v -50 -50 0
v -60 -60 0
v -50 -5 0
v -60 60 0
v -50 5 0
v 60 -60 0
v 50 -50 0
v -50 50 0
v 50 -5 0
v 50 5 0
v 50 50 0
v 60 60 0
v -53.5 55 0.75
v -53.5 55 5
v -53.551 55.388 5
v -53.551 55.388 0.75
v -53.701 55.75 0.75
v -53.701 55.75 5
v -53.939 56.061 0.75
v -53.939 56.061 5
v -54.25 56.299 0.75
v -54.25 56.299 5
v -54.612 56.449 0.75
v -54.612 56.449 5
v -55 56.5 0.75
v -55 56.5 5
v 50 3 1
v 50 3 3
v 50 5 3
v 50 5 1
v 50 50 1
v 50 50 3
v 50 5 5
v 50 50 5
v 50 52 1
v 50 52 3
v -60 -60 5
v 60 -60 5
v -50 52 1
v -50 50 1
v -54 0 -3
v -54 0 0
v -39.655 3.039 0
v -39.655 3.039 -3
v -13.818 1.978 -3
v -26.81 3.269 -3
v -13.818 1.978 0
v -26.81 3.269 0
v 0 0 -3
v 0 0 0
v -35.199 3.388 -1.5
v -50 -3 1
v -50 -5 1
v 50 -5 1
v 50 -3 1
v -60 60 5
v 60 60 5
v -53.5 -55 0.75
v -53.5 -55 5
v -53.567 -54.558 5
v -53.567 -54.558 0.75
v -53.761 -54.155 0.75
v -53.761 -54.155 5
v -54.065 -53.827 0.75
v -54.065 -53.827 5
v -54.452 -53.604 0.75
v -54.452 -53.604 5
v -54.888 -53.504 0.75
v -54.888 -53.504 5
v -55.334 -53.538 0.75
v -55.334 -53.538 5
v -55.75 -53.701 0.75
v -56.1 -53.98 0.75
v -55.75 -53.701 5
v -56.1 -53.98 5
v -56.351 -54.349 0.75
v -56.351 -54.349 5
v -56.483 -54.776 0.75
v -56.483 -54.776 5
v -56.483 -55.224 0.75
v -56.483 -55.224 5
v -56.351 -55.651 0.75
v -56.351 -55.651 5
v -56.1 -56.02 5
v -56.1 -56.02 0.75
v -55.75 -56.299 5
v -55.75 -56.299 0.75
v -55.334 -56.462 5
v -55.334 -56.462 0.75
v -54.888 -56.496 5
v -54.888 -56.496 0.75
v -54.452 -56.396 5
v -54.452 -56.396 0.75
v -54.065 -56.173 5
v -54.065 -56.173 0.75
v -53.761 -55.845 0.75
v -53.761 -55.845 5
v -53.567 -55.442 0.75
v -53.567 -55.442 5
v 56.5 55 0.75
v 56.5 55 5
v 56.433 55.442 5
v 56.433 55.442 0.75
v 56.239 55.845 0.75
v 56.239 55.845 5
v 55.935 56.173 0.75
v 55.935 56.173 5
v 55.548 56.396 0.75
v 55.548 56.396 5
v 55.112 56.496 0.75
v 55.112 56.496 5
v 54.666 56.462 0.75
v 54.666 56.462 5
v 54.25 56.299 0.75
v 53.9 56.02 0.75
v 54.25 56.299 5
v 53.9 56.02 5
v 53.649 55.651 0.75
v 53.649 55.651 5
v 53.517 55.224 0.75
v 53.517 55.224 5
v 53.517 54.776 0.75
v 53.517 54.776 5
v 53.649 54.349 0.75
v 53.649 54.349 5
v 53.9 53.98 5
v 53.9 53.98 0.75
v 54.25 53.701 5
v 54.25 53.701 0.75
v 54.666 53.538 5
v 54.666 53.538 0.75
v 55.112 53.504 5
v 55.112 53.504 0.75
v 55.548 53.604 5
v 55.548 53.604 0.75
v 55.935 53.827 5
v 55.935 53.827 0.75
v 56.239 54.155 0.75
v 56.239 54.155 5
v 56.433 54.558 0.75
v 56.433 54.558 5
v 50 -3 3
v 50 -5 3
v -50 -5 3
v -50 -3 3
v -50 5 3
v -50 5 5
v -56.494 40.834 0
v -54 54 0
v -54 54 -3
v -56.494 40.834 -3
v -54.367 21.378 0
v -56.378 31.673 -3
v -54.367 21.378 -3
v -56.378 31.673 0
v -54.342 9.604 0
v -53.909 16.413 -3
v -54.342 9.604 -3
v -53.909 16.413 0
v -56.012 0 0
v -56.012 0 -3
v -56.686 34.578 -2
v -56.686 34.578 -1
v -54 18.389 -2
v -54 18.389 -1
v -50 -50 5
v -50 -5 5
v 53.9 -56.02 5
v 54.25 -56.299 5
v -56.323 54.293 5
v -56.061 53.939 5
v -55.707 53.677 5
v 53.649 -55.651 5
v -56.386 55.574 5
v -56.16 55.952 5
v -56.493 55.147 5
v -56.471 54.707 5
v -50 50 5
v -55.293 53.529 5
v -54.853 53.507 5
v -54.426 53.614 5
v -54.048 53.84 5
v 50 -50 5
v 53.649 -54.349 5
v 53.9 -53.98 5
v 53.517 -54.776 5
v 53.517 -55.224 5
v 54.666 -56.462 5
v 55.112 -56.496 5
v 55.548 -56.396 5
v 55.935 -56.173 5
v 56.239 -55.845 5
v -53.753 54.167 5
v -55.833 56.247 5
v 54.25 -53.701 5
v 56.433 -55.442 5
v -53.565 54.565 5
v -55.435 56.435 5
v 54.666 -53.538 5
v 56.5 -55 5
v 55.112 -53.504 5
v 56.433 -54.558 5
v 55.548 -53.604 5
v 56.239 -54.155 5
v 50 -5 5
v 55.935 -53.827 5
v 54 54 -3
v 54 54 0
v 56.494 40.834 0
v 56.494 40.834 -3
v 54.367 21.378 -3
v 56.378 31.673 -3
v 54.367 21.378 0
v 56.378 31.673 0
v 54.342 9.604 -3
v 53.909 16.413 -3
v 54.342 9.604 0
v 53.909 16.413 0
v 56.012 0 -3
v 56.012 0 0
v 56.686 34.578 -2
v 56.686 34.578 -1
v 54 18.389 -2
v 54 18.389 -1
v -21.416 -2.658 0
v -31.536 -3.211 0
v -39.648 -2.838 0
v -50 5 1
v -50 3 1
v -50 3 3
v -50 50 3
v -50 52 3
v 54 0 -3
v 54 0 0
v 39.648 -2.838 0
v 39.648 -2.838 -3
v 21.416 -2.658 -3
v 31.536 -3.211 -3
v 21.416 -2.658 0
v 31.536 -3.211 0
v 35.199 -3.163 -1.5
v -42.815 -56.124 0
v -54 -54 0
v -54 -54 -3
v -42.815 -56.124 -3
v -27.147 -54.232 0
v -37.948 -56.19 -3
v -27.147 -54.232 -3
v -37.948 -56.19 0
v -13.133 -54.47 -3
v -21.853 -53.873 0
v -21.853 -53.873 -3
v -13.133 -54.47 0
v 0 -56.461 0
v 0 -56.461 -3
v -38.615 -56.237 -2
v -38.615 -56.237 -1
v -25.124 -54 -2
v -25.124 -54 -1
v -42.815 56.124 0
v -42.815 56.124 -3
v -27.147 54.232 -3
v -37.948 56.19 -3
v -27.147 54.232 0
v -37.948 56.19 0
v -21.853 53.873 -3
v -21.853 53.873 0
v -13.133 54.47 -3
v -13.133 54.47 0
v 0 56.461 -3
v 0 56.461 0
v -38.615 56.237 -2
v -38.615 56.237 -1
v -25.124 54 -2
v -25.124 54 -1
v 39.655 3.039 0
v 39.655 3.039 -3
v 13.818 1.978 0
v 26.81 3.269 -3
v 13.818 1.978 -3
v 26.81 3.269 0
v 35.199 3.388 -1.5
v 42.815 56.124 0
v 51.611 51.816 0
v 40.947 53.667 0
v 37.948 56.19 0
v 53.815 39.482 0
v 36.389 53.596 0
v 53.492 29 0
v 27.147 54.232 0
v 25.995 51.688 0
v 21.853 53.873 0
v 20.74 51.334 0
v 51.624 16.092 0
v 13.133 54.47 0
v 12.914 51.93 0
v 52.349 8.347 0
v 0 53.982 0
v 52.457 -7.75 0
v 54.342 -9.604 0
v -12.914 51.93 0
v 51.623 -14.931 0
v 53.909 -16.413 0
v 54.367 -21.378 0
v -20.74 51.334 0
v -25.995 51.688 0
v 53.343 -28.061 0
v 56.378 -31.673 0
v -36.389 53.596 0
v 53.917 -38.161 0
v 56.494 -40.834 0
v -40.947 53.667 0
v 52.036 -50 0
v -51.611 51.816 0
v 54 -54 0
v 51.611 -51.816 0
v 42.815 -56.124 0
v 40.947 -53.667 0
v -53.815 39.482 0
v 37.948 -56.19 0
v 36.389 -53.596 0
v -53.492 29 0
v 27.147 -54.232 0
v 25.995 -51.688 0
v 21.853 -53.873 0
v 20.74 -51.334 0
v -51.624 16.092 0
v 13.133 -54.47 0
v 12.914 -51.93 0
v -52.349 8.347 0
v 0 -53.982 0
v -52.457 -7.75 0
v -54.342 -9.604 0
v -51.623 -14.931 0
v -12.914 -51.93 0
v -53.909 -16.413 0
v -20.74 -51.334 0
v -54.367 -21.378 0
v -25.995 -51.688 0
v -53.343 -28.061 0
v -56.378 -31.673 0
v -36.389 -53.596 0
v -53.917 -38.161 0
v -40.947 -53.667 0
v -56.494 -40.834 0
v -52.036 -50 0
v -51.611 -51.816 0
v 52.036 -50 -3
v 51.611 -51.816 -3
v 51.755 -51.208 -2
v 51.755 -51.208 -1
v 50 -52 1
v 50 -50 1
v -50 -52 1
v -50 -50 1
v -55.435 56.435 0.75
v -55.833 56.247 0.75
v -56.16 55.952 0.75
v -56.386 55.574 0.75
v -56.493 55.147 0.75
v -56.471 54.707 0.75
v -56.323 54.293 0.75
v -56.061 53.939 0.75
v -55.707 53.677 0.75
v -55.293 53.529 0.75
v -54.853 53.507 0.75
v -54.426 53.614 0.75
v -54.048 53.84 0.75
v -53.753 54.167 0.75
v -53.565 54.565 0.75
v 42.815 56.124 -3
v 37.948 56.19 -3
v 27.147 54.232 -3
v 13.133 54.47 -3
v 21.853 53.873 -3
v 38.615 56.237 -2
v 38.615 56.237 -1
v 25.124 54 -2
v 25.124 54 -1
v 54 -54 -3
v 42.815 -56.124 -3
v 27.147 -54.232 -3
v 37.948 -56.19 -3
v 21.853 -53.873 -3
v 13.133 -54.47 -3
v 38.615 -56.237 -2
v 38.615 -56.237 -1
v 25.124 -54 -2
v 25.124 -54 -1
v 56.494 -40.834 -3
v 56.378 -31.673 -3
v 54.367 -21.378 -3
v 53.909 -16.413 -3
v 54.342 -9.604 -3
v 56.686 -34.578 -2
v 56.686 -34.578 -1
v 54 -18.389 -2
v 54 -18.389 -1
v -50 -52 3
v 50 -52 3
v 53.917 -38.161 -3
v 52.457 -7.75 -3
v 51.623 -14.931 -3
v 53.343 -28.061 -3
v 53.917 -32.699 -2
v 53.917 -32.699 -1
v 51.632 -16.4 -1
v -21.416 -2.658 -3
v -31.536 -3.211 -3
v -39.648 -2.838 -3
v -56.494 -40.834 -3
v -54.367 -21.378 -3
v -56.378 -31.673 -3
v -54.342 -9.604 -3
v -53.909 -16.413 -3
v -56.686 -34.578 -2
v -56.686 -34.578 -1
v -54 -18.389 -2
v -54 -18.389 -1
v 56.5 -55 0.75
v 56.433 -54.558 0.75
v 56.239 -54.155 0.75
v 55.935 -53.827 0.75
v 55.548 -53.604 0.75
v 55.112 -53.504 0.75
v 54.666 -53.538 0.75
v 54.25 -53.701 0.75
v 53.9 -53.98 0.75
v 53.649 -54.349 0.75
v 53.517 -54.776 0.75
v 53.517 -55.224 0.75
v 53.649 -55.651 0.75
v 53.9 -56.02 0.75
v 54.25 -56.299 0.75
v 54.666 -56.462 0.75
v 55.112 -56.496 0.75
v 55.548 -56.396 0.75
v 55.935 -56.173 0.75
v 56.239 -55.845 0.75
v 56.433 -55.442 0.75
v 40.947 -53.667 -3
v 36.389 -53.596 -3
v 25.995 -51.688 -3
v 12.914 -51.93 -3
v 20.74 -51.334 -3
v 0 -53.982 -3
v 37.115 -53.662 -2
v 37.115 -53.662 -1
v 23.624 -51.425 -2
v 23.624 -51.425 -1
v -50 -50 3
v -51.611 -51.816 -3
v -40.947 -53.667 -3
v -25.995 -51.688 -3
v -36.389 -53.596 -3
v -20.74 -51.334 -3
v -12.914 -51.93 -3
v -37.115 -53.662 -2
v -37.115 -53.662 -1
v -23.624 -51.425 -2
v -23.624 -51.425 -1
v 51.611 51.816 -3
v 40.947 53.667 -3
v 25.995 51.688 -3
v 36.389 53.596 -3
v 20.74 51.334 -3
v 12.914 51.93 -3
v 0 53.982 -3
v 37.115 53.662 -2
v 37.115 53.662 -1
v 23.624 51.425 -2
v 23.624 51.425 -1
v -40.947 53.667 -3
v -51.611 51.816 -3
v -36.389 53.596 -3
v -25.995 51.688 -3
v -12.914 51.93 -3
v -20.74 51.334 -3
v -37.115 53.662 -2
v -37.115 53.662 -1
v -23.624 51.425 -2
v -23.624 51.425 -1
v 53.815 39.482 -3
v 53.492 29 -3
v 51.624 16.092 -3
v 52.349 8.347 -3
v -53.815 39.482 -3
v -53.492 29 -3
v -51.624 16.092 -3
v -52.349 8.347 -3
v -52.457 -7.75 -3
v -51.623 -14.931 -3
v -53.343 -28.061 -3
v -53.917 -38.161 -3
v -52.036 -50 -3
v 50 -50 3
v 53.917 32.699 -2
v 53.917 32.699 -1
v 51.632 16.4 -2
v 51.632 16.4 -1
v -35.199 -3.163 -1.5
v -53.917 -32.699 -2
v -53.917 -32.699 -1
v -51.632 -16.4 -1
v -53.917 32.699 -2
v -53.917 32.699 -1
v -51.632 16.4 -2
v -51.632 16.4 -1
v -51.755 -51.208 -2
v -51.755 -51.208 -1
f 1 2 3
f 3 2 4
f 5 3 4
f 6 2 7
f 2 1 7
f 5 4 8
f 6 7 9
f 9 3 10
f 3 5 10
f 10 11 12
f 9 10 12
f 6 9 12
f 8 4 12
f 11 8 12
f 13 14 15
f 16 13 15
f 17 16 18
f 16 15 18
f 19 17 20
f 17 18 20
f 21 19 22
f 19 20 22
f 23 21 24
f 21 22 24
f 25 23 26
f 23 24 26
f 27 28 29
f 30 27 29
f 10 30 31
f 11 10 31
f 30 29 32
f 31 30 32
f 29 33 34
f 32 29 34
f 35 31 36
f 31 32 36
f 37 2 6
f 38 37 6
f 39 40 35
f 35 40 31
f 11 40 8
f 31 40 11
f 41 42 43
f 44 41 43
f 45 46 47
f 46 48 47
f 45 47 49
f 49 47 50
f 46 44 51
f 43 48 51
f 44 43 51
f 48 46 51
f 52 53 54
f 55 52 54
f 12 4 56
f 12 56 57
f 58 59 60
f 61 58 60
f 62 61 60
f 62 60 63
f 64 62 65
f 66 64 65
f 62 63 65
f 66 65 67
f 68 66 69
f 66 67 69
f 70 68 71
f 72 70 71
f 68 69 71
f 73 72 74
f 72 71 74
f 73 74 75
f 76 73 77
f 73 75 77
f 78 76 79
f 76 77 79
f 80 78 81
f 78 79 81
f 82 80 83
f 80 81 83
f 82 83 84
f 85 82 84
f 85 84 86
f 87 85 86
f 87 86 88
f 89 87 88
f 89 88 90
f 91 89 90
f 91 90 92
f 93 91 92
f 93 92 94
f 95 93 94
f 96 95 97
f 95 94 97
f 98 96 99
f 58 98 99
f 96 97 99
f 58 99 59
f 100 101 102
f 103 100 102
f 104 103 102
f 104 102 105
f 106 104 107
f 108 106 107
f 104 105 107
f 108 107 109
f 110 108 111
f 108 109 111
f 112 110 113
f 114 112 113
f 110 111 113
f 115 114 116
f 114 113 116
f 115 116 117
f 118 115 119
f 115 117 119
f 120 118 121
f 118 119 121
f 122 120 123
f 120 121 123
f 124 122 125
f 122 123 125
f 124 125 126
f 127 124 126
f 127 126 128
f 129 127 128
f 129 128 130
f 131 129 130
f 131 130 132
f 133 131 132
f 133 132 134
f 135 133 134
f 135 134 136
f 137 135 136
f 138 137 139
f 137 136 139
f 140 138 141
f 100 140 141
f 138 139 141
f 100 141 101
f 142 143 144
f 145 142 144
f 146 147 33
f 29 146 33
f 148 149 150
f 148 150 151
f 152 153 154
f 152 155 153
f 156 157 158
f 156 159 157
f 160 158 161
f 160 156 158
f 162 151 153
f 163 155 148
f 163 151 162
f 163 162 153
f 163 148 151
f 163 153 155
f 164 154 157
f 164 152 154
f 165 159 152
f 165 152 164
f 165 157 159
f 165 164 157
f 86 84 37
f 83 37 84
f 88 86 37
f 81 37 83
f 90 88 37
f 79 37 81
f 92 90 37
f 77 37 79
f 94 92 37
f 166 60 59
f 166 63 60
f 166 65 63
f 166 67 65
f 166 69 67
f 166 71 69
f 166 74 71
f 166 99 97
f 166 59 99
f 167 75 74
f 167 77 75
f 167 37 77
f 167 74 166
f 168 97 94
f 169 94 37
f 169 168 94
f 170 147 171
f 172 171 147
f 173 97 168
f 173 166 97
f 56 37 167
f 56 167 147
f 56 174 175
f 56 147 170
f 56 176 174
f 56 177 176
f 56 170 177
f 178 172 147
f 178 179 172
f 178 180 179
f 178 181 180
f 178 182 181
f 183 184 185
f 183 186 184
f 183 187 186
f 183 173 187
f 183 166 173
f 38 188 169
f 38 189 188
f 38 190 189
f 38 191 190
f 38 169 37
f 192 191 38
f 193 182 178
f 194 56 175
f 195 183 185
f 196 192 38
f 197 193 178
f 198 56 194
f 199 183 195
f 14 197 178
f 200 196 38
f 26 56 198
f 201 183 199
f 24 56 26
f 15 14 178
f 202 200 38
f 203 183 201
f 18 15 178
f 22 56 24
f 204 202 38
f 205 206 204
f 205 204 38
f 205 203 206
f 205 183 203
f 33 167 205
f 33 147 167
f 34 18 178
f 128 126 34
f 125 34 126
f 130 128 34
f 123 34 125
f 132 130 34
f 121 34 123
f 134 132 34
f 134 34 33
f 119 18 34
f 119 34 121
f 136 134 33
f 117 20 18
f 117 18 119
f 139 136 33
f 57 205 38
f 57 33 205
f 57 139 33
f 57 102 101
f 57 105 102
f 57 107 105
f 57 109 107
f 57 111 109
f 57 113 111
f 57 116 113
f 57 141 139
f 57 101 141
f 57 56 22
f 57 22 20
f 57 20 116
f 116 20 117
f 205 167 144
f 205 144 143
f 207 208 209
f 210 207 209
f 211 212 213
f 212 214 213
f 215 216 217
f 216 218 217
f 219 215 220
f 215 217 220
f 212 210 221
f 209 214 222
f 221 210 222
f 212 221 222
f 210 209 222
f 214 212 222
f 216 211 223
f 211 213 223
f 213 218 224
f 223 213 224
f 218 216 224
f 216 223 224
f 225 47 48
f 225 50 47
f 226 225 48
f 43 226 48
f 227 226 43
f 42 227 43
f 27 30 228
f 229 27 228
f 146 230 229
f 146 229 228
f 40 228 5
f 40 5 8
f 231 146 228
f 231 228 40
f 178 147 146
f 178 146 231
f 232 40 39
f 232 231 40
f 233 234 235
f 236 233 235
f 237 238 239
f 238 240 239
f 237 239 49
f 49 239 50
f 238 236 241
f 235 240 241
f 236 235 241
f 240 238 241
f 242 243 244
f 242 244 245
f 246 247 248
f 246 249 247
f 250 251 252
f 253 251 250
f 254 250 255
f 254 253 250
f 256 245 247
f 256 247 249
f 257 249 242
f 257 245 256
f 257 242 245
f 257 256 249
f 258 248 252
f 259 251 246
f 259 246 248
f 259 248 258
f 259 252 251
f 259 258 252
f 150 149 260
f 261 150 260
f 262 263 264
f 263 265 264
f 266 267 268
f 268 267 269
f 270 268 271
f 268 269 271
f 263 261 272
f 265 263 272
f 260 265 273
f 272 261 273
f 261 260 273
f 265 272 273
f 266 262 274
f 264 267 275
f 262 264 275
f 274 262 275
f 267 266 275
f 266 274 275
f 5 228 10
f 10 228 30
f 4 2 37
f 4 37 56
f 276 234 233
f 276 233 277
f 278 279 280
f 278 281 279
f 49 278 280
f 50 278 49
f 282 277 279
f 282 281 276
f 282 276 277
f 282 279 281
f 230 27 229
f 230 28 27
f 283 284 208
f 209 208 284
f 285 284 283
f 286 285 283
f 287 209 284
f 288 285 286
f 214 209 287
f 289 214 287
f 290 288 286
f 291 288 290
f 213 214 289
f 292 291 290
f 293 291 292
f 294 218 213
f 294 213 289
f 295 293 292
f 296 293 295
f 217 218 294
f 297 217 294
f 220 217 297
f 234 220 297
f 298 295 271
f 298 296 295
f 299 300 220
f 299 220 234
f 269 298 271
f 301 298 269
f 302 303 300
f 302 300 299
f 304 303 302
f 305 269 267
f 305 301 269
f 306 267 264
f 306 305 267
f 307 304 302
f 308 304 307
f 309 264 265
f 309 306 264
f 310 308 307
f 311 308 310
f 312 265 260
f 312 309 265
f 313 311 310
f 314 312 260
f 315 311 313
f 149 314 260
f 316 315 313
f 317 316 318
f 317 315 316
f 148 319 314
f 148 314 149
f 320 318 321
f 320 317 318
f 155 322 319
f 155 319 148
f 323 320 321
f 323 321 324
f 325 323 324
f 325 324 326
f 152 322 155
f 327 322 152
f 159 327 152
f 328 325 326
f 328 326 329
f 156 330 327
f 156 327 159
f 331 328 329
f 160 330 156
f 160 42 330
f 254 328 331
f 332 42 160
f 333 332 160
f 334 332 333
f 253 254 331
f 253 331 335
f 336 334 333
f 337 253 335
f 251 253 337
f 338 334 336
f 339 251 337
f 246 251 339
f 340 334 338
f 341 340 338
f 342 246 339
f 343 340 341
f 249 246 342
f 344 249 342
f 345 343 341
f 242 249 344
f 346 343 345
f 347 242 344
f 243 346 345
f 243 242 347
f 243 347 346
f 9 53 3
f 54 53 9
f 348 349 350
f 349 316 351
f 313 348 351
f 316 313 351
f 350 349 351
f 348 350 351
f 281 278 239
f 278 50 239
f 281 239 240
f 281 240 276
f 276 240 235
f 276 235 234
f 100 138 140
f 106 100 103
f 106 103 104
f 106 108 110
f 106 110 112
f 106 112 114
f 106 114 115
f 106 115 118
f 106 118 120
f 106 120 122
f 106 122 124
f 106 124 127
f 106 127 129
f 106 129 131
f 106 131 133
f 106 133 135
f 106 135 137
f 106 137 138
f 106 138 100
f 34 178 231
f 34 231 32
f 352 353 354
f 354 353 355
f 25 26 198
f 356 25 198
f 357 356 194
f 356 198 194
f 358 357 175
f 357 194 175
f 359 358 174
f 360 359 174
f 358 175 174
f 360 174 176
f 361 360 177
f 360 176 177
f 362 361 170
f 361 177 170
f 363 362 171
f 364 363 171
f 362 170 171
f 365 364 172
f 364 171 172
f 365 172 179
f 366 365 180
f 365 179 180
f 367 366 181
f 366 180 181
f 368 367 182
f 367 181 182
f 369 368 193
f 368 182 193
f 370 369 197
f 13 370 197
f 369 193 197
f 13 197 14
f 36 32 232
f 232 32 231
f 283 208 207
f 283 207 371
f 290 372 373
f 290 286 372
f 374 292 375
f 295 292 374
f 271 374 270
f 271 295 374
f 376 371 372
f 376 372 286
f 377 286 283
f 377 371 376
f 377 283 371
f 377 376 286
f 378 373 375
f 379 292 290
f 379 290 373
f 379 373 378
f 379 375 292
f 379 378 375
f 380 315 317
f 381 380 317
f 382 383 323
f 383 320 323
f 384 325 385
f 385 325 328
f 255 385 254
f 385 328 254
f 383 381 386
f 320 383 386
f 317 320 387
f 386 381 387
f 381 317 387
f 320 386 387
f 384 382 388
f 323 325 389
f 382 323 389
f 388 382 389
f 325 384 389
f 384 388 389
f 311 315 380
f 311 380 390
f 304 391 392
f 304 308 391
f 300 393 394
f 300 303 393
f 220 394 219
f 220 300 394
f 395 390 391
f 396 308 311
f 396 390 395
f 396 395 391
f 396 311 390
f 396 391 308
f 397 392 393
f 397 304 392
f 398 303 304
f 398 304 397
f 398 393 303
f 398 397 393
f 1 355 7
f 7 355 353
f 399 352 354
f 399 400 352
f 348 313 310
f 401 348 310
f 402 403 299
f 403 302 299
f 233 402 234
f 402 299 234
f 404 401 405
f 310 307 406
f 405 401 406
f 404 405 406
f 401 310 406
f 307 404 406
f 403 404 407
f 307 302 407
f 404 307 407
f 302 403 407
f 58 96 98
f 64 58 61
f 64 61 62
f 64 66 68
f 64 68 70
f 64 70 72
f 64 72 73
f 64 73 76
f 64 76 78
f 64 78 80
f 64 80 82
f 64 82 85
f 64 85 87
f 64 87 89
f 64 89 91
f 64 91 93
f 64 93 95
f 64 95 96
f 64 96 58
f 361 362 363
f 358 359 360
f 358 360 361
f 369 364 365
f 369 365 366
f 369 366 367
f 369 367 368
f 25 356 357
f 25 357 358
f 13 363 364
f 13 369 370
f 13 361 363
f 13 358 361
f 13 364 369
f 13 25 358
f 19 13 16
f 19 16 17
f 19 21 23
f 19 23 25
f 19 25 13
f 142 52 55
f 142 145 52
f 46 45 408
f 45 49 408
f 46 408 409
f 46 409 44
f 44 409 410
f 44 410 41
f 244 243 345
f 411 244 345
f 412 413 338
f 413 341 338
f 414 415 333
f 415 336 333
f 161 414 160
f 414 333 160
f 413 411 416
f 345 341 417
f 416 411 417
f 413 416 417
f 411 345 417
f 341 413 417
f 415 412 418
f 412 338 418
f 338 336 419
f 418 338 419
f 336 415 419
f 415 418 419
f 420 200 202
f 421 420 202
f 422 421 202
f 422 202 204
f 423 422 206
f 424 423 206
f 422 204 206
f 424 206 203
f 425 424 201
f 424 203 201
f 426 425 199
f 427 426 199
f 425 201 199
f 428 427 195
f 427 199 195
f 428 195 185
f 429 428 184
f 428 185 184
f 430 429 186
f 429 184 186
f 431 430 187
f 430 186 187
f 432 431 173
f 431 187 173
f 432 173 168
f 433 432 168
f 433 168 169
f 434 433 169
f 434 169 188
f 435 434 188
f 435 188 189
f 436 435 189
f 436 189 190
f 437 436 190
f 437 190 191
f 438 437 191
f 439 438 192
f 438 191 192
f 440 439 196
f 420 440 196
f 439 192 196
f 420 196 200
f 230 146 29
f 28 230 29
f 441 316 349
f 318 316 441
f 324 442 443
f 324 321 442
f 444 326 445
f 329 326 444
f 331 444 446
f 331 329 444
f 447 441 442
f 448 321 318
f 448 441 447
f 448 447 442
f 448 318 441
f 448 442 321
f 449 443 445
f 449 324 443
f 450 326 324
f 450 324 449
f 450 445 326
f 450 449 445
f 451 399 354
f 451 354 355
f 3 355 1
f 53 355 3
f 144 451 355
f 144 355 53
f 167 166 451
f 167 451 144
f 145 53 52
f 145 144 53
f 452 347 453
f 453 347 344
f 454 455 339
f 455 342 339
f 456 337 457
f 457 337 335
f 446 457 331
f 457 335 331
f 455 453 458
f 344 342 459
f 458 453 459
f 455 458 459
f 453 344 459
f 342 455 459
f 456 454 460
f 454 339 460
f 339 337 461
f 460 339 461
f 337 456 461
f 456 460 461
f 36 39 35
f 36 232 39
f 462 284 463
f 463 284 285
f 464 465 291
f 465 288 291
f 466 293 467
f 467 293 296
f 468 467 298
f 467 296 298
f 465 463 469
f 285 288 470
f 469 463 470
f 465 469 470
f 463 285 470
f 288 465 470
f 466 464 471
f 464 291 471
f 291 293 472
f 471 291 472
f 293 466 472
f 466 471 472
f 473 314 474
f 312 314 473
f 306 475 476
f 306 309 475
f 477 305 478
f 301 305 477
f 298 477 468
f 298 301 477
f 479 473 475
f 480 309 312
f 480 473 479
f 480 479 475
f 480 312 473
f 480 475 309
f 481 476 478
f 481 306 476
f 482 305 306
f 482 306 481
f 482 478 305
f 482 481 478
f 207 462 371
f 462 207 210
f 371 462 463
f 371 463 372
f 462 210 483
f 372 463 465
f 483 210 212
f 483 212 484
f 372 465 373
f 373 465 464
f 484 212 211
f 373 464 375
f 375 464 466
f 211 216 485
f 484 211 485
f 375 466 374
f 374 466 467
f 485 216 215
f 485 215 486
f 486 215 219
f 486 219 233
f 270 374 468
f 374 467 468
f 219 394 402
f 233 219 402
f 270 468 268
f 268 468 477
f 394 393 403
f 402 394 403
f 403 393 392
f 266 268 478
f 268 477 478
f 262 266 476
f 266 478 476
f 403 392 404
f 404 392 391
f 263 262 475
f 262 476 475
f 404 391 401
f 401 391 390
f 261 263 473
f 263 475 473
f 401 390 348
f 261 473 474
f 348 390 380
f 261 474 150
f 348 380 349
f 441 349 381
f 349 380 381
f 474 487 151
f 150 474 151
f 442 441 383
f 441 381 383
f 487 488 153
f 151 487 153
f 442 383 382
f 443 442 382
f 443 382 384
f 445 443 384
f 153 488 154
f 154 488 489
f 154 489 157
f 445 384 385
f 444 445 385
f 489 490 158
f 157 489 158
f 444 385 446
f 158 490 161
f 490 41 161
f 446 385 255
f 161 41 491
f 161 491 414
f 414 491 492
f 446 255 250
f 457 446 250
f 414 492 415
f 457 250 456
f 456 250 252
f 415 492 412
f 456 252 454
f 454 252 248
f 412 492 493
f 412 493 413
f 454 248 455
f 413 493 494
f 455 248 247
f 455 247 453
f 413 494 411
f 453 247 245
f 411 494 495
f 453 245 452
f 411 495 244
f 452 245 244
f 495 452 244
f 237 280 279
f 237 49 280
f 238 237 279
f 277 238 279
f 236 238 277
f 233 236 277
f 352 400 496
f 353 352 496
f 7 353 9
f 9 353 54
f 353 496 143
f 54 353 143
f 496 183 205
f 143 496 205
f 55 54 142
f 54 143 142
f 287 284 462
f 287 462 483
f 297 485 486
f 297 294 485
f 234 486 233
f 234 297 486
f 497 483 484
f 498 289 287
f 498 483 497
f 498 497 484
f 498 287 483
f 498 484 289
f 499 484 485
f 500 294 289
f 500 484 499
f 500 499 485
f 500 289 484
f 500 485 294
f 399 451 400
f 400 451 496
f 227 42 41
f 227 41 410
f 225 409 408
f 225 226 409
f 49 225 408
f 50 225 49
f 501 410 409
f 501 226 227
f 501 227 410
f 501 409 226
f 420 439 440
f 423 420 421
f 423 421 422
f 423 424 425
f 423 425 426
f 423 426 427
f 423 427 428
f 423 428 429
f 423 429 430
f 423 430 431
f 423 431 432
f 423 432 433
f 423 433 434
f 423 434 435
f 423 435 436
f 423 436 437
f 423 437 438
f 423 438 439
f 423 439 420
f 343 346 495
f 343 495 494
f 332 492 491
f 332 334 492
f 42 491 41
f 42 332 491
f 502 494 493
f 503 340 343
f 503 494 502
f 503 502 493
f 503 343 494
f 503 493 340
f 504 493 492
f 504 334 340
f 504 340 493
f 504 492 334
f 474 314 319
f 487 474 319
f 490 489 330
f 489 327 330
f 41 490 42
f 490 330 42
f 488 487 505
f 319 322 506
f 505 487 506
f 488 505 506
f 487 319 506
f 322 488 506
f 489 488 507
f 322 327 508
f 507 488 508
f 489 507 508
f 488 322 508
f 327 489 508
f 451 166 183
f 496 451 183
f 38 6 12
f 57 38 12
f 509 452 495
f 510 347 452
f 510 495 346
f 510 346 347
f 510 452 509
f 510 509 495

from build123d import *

# Parameters (mm, degrees)
F0_W      = 120
F0_H      = 120
F1_DEPTH  = 5
F2_W      = 100
F2_H      = 100
F3_DEPTH  = 5
F4_W      = 100
F4_H      = 10
F5_DEPTH  = 5
F7_DEPTH  = 2
F9_DEPTH  = 2
F11_DEPTH = 2
F13_DEPTH = 2
F14_R     = 1.5
F15_DEPTH = 4.25
F17_DEPTH = 3


with BuildPart() as f1:
    # F0 (on Top) → F1 (new body)
    with BuildSketch(Plane.XY):
        Rectangle(F0_W, F0_H)
    extrude(amount=F1_DEPTH)

    # F2 (on face) → F3 (cut)
    with BuildSketch(Plane.XY.offset(5)):
        Rectangle(F2_W, F2_H)
    extrude(amount=-F3_DEPTH, mode=Mode.SUBTRACT)

    # F4 (on face) → F5 (join)
    with BuildSketch(Plane.XY.offset(5)):
        Rectangle(F4_W, F4_H)
    extrude(amount=-F5_DEPTH)

    # F6 (on face) → F7 (cut)
    with BuildSketch(Plane(origin=(0, 5, 0), x_dir=(-1, 0, 0), z_dir=(0, 1, 0))):
        Polygon((-50, 1), (0, 1), (50, 1), (50, 3), (-50, 3), align=None)
    extrude(amount=-F7_DEPTH, mode=Mode.SUBTRACT)

    # F8 (on face) → F9 (cut)
    with BuildSketch(Plane.XZ.offset(-50)):
        Polygon((-50, 1), (0, 1), (50, 1), (50, 3), (-50, 3), align=None)
    extrude(amount=-F9_DEPTH, mode=Mode.SUBTRACT)

    # F10 (on face) → F11 (cut)
    with BuildSketch(Plane.XZ.offset(5)):
        Polygon((-50, 1), (0, 1), (50, 1), (50, 3), (-50, 3), align=None)
    extrude(amount=-F11_DEPTH, mode=Mode.SUBTRACT)

    # F12 (on face) → F13 (cut)
    with BuildSketch(Plane(origin=(0, -50, 0), x_dir=(-1, 0, 0), z_dir=(0, 1, 0))):
        Polygon((-50, 1), (0, 1), (50, 1), (50, 3), (-50, 3), align=None)
    extrude(amount=-F13_DEPTH, mode=Mode.SUBTRACT)

    # F14 (on face) → F15 (cut)
    with BuildSketch(Plane.XY.offset(5)):
        with BuildLine():
            ThreePointArc((-53.5, 55), (-53.9393398282, 56.0606601718), (-55, 56.5))
            ThreePointArc((-55, 56.5), (-56.0606601718, 53.9393398282), (-53.5, 55))
        make_face()
        with Locations((55, 55)):
            Circle(F14_R)
        with Locations((-55, -55)):
            Circle(F14_R)
        with Locations((55, -55)):
            Circle(F14_R)
    extrude(amount=-F15_DEPTH, mode=Mode.SUBTRACT)


with BuildPart() as f17:
    # F16 (on face) → F17 (new body)
    with BuildSketch(Plane(origin=(0, 0, 0), x_dir=(1, 0, 0), z_dir=(0, 0, -1))):
        with BuildLine():
            add(Edge.make_bspline(
                [(-52.0355137877, 50), (-53.4130465347, 43.9501603479), (-55.2130292926, 32.4194226977), (-50.0765832784, 16.1912205485), (-52.8507514546, 6.0722194825), (-54, 0)],
                knots=[0.0317306563, 0.0317306563, 0.0317306563, 0.0317306563, 0.3506085969, 0.6747541546, 1, 1, 1, 1], degree=3))
            Line((-52.0355137877, 50), (-54, 50))
            Line((-54, 50), (-54, 54))
            add(Edge.make_bspline(
                [(-54, 54), (-55.526996489, 47.3387527699), (-58.4509835735, 34.5833856113), (-52.3858314775, 18.4614750339), (-54.7791002275, 6.2754022767), (-56.0115501285, 0)],
                knots=[0, 0, 0, 0, 0.3464790875, 0.6634595325, 1, 1, 1, 1], degree=3))
            add(Edge.make_bspline(
                [(-54, -54), (-55.526996489, -47.3387527699), (-58.4509835735, -34.5833856113), (-52.3858314775, -18.4614750339), (-54.7791002275, -6.2754022767), (-56.0115501285, 0)],
                knots=[0, 0, 0, 0, 0.3464790875, 0.6634595325, 1, 1, 1, 1], degree=3))
            add(Edge.make_bspline(
                [(-54, -54), (-48.6784019716, -55.2474172449), (-38.3658382336, -57.6647493654), (-24.8794311821, -52.2991964671), (-9.0933080788, -54.940143262), (0, -56.4614124596)],
                knots=[0, 0, 0, 0, 0.3113206253, 0.6032988162, 1, 1, 1, 1], degree=3))
            add(Edge.make_bspline(
                [(54, -54), (48.6784019716, -55.2474172449), (38.3658382336, -57.6647493654), (24.8794311821, -52.2991964671), (9.0933080788, -54.940143262), (0, -56.4614124596)],
                knots=[0, 0, 0, 0, 0.3113206253, 0.6032988162, 1, 1, 1, 1], degree=3))
            add(Edge.make_bspline(
                [(54, -54), (55.526996489, -47.3387527699), (58.4509835735, -34.5833856113), (52.3858314775, -18.4614750339), (54.7791002275, -6.2754022767), (56.0115501285, 0)],
                knots=[0, 0, 0, 0, 0.3464790875, 0.6634595325, 1, 1, 1, 1], degree=3))
            add(Edge.make_bspline(
                [(54, 54), (55.526996489, 47.3387527699), (58.4509835735, 34.5833856113), (52.3858314775, 18.4614750339), (54.7791002275, 6.2754022767), (56.0115501285, 0)],
                knots=[0, 0, 0, 0, 0.3464790875, 0.6634595325, 1, 1, 1, 1], degree=3))
            Line((54, 54), (54, 50))
            Line((54, 50), (52.0355137877, 50))
            add(Edge.make_bspline(
                [(52.0355137877, 50), (53.4130465347, 43.9501603479), (55.2130292926, 32.4194226977), (50.0765832784, 16.1912205485), (52.8507514546, 6.0722194825), (54, 0)],
                knots=[0.0317306563, 0.0317306563, 0.0317306563, 0.0317306563, 0.3506085969, 0.6747541546, 1, 1, 1, 1], degree=3))
            add(Edge.make_bspline(
                [(51.6106709177, -51.8160055037), (53.2227134056, -45.0899877632), (55.3813531214, -32.9512287582), (50.0765832784, -16.1912205485), (52.8507514546, -6.0722194825), (54, 0)],
                knots=[0, 0, 0, 0, 0.3506085969, 0.6747541546, 1, 1, 1, 1], degree=3))
            add(Edge.make_bspline(
                [(51.6106709177, -51.8160055037), (46.3390114359, -53.051716828), (37.0479096559, -54.9210575543), (23.1436768388, -49.7702397152), (9.0144752829, -52.4735548912), (0, -53.9816357195)],
                knots=[0, 0, 0, 0, 0.3083991533, 0.6067379457, 1, 1, 1, 1], degree=3))
            add(Edge.make_bspline(
                [(-51.6106709177, -51.8160055037), (-46.3390114359, -53.051716828), (-37.0479096559, -54.9210575543), (-23.1436768388, -49.7702397152), (-9.0144752829, -52.4735548912), (0, -53.9816357195)],
                knots=[0, 0, 0, 0, 0.3083991533, 0.6067379457, 1, 1, 1, 1], degree=3))
            add(Edge.make_bspline(
                [(-51.6106709177, -51.8160055037), (-53.2227134056, -45.0899877632), (-55.3813531214, -32.9512287582), (-50.0765832784, -16.1912205485), (-52.8507514546, -6.0722194825), (-54, 0)],
                knots=[0, 0, 0, 0, 0.3506085969, 0.6747541546, 1, 1, 1, 1], degree=3))
        make_face()
        with BuildLine():
            Line((-54, 50), (-52.0355137877, 50))
            add(Edge.make_bspline(
                [(-51.6106709177, 51.8160055037), (-51.7565634218, 51.2072898041), (-51.8984393381, 50.6020027052), (-52.0355137877, 50)],
                knots=[0, 0, 0, 0, 0.0317306563, 0.0317306563, 0.0317306563, 0.0317306563], degree=3))
            add(Edge.make_bspline(
                [(-51.6106709177, 51.8160055037), (-46.3390114359, 53.051716828), (-37.0479096559, 54.9210575543), (-23.1436768388, 49.7702397152), (-9.0144752829, 52.4735548912), (0, 53.9816357195)],
                knots=[0, 0, 0, 0, 0.3083991533, 0.6067379457, 1, 1, 1, 1], degree=3))
            add(Edge.make_bspline(
                [(51.6106709177, 51.8160055037), (46.3390114359, 53.051716828), (37.0479096559, 54.9210575543), (23.1436768388, 49.7702397152), (9.0144752829, 52.4735548912), (0, 53.9816357195)],
                knots=[0, 0, 0, 0, 0.3083991533, 0.6067379457, 1, 1, 1, 1], degree=3))
            add(Edge.make_bspline(
                [(51.6106709177, 51.8160055037), (51.7565634218, 51.2072898041), (51.8984393381, 50.6020027052), (52.0355137877, 50)],
                knots=[0, 0, 0, 0, 0.0317306563, 0.0317306563, 0.0317306563, 0.0317306563], degree=3))
            Line((52.0355137877, 50), (54, 50))
            Line((54, 50), (54, 54))
            add(Edge.make_bspline(
                [(54, 54), (48.6784019716, 55.2474172449), (38.3658382336, 57.6647493654), (24.8794311821, 52.2991964671), (9.0933080788, 54.940143262), (0, 56.4614124596)],
                knots=[0, 0, 0, 0, 0.3113206253, 0.6032988162, 1, 1, 1, 1], degree=3))
            add(Edge.make_bspline(
                [(-54, 54), (-48.6784019716, 55.2474172449), (-38.3658382336, 57.6647493654), (-24.8794311821, 52.2991964671), (-9.0933080788, 54.940143262), (0, 56.4614124596)],
                knots=[0, 0, 0, 0, 0.3113206253, 0.6032988162, 1, 1, 1, 1], degree=3))
            Line((-54, 54), (-54, 50))
        make_face()
    extrude(amount=F17_DEPTH)


with BuildPart() as f17b:
    # F16 (on face) → F17, piece 2 (new body)
    with BuildSketch(Plane(origin=(0, 0, 0), x_dir=(1, 0, 0), z_dir=(0, 0, -1))):
        with BuildLine():
            add(Edge.make_bspline(
                [(54, 0), (48.2307514748, 1.4417043923), (34.6066518669, 4.8462941167), (12.6556506787, 1.7722894911), (0, 0)],
                knots=[0, 0, 0, 0, 0.4234590682, 1, 1, 1, 1], degree=3))
            add(Edge.make_bspline(
                [(54, 0), (48.2322619922, -1.5442535468), (34.6173411903, -5.1895109613), (12.6571285499, -1.8974394072), (0, 0)],
                knots=[0, 0, 0, 0, 0.423633607, 1, 1, 1, 1], degree=3))
        make_face()
    extrude(amount=F17_DEPTH)


with BuildPart() as f17c:
    # F16 (on face) → F17, piece 3 (new body)
    with BuildSketch(Plane(origin=(0, 0, 0), x_dir=(1, 0, 0), z_dir=(0, 0, -1))):
        with BuildLine():
            add(Edge.make_bspline(
                [(-54, 0), (-48.2307514748, 1.4417043923), (-34.6066518669, 4.8462941167), (-12.6556506787, 1.7722894911), (0, 0)],
                knots=[0, 0, 0, 0, 0.4234590682, 1, 1, 1, 1], degree=3))
            add(Edge.make_bspline(
                [(-54, 0), (-48.2322619922, -1.5442535468), (-34.6173411903, -5.1895109613), (-12.6571285499, -1.8974394072), (0, 0)],
                knots=[0, 0, 0, 0, 0.423633607, 1, 1, 1, 1], degree=3))
        make_face()
    extrude(amount=F17_DEPTH)


solid = Compound([f1.part, f17.part, f17b.part, f17c.part])
